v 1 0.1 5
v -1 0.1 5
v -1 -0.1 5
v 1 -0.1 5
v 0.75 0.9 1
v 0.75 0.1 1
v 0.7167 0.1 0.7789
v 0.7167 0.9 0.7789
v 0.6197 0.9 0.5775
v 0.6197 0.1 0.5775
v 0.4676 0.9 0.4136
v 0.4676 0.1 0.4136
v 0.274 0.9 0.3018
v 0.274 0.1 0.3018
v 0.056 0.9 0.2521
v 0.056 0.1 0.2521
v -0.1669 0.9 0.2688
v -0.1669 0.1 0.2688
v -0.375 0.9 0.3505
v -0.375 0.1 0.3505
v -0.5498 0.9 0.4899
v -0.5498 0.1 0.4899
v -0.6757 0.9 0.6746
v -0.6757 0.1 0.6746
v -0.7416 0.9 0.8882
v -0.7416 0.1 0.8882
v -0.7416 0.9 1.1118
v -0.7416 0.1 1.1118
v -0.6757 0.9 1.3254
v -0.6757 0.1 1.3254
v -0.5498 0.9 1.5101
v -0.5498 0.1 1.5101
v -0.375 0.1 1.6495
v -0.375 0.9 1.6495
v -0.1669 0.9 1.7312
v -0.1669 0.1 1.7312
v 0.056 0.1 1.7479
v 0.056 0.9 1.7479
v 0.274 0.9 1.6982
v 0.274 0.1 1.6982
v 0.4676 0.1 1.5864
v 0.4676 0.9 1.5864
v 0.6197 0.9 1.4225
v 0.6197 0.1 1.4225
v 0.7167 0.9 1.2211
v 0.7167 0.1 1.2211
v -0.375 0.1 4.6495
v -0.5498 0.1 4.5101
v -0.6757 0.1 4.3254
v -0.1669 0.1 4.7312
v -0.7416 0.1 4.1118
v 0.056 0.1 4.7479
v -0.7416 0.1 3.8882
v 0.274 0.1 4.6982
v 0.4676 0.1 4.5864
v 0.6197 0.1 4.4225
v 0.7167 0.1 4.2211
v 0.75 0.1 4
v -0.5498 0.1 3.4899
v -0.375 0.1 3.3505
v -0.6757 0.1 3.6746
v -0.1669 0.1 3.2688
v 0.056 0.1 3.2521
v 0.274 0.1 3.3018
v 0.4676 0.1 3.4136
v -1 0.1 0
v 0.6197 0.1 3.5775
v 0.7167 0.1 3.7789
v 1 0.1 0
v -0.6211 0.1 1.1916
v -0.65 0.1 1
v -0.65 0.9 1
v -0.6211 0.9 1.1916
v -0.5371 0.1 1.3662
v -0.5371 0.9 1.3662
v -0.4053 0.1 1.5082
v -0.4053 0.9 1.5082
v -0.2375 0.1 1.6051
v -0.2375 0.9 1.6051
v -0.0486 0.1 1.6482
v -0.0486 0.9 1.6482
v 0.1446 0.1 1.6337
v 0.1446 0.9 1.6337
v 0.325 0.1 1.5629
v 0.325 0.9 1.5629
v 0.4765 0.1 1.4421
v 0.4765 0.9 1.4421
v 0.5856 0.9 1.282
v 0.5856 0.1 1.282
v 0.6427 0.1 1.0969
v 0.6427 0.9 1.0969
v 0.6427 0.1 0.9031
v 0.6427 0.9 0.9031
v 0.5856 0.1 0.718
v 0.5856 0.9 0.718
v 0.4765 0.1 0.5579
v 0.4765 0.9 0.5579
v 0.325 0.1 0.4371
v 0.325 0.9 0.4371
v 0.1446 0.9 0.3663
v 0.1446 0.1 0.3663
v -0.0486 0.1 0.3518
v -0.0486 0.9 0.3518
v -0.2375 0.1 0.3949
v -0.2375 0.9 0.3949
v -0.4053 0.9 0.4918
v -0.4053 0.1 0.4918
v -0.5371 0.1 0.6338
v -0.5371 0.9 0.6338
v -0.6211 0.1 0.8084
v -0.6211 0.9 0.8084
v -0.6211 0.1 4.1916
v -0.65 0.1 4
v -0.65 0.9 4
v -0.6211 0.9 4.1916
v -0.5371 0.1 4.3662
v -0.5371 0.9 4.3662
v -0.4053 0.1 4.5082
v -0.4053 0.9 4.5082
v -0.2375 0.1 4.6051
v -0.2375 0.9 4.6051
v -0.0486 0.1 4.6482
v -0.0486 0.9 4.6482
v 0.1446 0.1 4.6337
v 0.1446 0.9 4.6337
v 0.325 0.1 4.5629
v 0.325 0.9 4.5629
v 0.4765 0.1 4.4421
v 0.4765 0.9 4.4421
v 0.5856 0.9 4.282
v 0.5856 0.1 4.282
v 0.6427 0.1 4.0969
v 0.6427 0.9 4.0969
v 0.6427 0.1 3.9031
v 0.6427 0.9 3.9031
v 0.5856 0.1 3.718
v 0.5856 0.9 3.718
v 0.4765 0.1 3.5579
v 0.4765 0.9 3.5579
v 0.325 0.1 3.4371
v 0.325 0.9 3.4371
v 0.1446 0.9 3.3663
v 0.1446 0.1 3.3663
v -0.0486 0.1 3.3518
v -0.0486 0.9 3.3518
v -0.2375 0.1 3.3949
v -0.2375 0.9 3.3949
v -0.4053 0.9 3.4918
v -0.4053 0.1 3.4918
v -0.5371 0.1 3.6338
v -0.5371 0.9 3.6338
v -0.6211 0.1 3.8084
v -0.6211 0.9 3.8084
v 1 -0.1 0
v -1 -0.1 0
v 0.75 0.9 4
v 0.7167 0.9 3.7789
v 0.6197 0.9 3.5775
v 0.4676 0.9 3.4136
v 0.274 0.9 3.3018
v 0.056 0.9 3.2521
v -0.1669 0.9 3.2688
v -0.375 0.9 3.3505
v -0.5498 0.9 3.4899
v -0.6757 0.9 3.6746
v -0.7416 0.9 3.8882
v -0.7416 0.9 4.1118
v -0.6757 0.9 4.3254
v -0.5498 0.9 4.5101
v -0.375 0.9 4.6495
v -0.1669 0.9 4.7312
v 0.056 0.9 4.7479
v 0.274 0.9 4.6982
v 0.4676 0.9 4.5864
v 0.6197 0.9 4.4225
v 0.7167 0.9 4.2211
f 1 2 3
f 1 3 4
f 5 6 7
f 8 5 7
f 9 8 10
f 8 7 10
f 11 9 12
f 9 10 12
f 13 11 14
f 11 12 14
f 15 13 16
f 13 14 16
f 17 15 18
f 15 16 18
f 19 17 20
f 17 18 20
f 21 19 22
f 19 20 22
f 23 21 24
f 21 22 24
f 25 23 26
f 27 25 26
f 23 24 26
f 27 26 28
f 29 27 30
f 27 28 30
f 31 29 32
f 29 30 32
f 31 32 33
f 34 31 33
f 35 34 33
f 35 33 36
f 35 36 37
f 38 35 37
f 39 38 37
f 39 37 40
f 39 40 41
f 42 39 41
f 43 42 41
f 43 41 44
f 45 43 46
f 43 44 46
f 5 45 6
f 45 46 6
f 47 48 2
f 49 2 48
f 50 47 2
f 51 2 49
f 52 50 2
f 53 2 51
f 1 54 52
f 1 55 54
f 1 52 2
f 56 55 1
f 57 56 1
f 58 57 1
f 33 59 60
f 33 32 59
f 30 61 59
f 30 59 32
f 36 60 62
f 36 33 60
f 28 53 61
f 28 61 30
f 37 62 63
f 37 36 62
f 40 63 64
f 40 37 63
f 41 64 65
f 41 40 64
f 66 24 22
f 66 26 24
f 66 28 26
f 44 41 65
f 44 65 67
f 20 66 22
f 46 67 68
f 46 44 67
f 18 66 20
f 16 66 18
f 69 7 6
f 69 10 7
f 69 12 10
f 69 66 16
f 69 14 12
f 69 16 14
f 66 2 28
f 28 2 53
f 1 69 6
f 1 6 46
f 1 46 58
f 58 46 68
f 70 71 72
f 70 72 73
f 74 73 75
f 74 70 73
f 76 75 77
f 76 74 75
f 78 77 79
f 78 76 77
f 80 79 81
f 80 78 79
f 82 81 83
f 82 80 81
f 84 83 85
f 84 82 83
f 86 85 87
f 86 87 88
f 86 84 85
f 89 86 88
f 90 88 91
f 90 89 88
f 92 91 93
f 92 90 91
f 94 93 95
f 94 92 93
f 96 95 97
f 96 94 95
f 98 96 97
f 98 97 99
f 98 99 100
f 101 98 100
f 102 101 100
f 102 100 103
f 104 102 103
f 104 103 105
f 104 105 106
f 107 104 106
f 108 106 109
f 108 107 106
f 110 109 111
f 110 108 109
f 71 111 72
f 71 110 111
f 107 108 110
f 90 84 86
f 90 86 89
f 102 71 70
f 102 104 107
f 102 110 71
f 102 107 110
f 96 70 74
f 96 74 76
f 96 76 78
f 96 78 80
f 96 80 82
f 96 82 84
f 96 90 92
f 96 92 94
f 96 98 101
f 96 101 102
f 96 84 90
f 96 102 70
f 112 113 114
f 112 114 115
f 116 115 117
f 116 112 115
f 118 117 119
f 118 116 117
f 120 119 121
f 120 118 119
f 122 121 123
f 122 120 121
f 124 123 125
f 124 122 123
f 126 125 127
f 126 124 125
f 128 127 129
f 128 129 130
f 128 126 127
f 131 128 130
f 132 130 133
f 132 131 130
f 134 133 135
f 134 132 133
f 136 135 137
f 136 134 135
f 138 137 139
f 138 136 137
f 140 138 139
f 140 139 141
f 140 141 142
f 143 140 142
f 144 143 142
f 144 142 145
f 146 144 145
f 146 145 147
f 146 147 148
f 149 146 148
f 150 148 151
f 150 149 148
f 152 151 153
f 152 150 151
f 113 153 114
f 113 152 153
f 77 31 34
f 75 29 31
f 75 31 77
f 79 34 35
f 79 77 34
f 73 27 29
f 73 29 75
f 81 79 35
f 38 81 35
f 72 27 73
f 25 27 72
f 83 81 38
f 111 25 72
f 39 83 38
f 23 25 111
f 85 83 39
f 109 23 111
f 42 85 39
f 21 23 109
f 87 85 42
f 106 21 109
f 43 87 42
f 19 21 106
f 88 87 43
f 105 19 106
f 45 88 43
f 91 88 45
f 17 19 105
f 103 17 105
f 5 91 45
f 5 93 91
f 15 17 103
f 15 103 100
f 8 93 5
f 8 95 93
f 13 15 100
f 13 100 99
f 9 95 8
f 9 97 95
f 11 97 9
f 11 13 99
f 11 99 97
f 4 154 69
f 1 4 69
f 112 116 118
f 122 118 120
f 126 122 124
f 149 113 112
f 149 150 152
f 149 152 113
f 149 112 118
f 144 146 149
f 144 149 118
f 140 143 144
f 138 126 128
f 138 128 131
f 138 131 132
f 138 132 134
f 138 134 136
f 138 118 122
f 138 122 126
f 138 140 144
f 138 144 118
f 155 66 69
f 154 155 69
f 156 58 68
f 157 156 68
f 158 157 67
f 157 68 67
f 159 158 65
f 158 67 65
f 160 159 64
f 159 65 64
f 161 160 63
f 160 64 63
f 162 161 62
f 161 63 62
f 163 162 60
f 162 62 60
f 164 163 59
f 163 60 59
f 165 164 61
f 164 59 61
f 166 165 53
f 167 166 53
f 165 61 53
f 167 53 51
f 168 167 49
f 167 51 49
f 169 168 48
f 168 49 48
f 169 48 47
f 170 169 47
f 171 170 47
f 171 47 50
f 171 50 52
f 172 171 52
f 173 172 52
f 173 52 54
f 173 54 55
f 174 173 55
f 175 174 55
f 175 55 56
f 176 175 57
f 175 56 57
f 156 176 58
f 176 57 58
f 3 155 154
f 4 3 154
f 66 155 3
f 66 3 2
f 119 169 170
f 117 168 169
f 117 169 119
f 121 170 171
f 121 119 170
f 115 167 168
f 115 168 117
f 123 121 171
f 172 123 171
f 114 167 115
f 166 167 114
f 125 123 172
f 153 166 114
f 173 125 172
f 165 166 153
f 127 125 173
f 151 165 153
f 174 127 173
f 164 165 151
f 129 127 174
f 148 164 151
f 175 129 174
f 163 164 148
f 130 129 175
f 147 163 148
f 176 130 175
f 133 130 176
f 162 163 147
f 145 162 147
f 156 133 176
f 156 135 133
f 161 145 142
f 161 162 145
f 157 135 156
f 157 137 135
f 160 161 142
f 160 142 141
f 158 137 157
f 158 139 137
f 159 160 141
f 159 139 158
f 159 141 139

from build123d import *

# Parameters (mm, degrees)
SKETCH1_W           = 2
SKETCH1_H           = 0.2
BOSS_EXTRUDE1_DEPTH = 5
SKETCH2_R           = 0.75
SKETCH2_R_2         = 0.65
BOSS_EXTRUDE2_DEPTH = 0.8


with BuildPart() as part:
    # Sketch1 → Boss-Extrude1 (new body)
    with BuildSketch(Plane.XY):
        Rectangle(SKETCH1_W, SKETCH1_H)
    extrude(amount=BOSS_EXTRUDE1_DEPTH)

    # Sketch2 → Boss-Extrude2 (add)
    # profile 1 of 2: a face of its own
    with BuildSketch(Plane(origin=(0, 0.1, 0), x_dir=(1, 0, 0), z_dir=(0, 1, 0))):
        with Locations((0, -1)):
            Circle(SKETCH2_R)
        with Locations(Location((0, -1, 0), (0, 0, 180))):
            Circle(SKETCH2_R_2, mode=Mode.SUBTRACT)
    # profile 2 of 2: a face of its own
    with BuildSketch(Plane(origin=(0, 0.1, 0), x_dir=(1, 0, 0), z_dir=(0, 1, 0))):
        with Locations((0, -4)):
            Circle(SKETCH2_R)
        with Locations(Location((0, -4, 0), (0, 0, 180))):
            Circle(SKETCH2_R_2, mode=Mode.SUBTRACT)
    extrude(amount=BOSS_EXTRUDE2_DEPTH)


solid = part.part
